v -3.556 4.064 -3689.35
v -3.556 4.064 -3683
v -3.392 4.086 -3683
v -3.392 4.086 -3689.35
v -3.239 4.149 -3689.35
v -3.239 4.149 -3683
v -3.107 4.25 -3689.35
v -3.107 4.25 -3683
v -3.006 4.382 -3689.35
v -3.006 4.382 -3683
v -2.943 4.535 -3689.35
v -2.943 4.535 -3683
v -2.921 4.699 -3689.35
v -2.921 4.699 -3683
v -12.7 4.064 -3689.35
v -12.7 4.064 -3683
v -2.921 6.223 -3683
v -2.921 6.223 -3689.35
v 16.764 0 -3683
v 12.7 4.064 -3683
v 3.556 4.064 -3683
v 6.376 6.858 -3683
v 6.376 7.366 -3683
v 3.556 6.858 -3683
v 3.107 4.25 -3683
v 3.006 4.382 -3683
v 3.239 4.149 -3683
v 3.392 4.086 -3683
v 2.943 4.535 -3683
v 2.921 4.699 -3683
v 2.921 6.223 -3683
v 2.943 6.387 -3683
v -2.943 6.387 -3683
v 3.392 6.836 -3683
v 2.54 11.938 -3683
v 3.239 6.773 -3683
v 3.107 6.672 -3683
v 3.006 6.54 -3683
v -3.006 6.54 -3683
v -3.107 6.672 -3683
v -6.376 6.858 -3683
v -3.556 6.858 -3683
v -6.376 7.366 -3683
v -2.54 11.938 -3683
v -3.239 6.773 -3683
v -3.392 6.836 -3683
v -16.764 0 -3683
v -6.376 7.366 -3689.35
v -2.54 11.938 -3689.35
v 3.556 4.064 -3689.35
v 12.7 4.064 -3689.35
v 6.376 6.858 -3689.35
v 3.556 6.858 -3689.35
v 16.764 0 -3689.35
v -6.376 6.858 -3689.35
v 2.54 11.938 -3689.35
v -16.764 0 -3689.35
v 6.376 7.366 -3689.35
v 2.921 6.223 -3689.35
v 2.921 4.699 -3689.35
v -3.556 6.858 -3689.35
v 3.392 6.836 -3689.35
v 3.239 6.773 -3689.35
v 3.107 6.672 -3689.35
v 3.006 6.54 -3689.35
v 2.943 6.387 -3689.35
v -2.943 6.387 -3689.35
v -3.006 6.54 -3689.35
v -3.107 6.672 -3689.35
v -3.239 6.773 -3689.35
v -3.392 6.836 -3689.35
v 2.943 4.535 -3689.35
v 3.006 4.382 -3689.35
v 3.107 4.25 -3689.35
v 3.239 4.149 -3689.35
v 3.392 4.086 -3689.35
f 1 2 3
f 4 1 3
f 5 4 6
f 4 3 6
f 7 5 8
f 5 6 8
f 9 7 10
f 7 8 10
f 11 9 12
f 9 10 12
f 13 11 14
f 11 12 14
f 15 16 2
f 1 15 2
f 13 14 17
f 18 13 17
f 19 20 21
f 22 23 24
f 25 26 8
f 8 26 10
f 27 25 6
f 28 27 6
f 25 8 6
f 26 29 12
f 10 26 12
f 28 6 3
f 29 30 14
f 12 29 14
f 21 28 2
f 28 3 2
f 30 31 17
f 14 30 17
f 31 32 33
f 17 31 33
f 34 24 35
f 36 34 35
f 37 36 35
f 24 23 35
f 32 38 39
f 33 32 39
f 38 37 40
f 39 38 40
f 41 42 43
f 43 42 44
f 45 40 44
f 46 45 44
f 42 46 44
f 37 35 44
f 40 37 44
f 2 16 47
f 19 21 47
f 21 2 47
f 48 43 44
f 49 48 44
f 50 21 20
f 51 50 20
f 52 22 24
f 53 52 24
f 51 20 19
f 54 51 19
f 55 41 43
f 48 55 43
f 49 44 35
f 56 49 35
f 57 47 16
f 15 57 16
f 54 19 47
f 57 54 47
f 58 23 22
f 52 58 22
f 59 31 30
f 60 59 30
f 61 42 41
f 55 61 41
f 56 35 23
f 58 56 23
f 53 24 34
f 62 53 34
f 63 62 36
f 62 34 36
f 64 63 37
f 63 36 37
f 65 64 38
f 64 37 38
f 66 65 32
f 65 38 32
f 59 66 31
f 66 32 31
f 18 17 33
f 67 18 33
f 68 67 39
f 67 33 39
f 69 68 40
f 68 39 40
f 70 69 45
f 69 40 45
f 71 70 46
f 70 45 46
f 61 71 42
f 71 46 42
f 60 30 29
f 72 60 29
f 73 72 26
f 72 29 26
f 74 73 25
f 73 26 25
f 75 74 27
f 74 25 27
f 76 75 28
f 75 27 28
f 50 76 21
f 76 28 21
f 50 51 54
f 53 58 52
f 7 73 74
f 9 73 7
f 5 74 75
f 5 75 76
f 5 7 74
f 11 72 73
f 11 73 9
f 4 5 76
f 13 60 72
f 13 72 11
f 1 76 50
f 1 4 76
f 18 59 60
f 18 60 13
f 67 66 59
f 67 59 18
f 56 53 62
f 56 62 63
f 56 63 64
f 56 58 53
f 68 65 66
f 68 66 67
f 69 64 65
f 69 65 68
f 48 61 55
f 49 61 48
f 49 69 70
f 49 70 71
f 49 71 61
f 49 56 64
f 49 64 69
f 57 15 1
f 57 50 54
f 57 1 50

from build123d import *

# Parameters (mm, degrees)
BOSS_EXTRUDE8_DEPTH = 6.35


with BuildPart() as part:
    # Sketch1 → Boss-Extrude8 (new body)
    with BuildSketch(Plane(origin=(0, 0, -3683), x_dir=(-1, 0, 0), z_dir=(0, 0, -1))):
        with BuildLine():
            Line((12.7, 4.064), (3.556, 4.064))
            ThreePointArc((3.556, 4.064), (3.106987194, 4.249987194), (2.921, 4.699))
            Line((2.921, 4.699), (2.921, 6.223))
            ThreePointArc((2.921, 6.223), (3.106987194, 6.672012806), (3.556, 6.858))
            Line((3.556, 6.858), (6.376363549, 6.858))
            Line((6.376363549, 6.858), (6.376363549, 7.365999958))
            Line((6.376363549, 7.365999958), (2.54, 11.938))
            Line((2.54, 11.938), (-2.54, 11.938))
            Line((-2.54, 11.938), (-6.376363549, 7.365999958))
            Line((-6.376363549, 7.365999958), (-6.376363549, 6.858))
            Line((-6.376363549, 6.858), (-3.556, 6.858))
            ThreePointArc((-3.556, 6.858), (-3.106987194, 6.672012806), (-2.921, 6.223))
            Line((-2.921, 6.223), (-2.921, 4.699))
            ThreePointArc((-2.921, 4.699), (-3.106987194, 4.249987194), (-3.556, 4.064))
            Line((-3.556, 4.064), (-12.7, 4.064))
            Line((-12.7, 4.064), (-16.764, 0))
            Line((-16.764, 0), (-12.7, 0))
            Line((-12.7, 0), (12.7, 0))
            Line((12.7, 0), (16.764, 0))
            Line((16.764, 0), (12.7, 4.064))
        make_face()
    extrude(amount=BOSS_EXTRUDE8_DEPTH)


solid = part.part
